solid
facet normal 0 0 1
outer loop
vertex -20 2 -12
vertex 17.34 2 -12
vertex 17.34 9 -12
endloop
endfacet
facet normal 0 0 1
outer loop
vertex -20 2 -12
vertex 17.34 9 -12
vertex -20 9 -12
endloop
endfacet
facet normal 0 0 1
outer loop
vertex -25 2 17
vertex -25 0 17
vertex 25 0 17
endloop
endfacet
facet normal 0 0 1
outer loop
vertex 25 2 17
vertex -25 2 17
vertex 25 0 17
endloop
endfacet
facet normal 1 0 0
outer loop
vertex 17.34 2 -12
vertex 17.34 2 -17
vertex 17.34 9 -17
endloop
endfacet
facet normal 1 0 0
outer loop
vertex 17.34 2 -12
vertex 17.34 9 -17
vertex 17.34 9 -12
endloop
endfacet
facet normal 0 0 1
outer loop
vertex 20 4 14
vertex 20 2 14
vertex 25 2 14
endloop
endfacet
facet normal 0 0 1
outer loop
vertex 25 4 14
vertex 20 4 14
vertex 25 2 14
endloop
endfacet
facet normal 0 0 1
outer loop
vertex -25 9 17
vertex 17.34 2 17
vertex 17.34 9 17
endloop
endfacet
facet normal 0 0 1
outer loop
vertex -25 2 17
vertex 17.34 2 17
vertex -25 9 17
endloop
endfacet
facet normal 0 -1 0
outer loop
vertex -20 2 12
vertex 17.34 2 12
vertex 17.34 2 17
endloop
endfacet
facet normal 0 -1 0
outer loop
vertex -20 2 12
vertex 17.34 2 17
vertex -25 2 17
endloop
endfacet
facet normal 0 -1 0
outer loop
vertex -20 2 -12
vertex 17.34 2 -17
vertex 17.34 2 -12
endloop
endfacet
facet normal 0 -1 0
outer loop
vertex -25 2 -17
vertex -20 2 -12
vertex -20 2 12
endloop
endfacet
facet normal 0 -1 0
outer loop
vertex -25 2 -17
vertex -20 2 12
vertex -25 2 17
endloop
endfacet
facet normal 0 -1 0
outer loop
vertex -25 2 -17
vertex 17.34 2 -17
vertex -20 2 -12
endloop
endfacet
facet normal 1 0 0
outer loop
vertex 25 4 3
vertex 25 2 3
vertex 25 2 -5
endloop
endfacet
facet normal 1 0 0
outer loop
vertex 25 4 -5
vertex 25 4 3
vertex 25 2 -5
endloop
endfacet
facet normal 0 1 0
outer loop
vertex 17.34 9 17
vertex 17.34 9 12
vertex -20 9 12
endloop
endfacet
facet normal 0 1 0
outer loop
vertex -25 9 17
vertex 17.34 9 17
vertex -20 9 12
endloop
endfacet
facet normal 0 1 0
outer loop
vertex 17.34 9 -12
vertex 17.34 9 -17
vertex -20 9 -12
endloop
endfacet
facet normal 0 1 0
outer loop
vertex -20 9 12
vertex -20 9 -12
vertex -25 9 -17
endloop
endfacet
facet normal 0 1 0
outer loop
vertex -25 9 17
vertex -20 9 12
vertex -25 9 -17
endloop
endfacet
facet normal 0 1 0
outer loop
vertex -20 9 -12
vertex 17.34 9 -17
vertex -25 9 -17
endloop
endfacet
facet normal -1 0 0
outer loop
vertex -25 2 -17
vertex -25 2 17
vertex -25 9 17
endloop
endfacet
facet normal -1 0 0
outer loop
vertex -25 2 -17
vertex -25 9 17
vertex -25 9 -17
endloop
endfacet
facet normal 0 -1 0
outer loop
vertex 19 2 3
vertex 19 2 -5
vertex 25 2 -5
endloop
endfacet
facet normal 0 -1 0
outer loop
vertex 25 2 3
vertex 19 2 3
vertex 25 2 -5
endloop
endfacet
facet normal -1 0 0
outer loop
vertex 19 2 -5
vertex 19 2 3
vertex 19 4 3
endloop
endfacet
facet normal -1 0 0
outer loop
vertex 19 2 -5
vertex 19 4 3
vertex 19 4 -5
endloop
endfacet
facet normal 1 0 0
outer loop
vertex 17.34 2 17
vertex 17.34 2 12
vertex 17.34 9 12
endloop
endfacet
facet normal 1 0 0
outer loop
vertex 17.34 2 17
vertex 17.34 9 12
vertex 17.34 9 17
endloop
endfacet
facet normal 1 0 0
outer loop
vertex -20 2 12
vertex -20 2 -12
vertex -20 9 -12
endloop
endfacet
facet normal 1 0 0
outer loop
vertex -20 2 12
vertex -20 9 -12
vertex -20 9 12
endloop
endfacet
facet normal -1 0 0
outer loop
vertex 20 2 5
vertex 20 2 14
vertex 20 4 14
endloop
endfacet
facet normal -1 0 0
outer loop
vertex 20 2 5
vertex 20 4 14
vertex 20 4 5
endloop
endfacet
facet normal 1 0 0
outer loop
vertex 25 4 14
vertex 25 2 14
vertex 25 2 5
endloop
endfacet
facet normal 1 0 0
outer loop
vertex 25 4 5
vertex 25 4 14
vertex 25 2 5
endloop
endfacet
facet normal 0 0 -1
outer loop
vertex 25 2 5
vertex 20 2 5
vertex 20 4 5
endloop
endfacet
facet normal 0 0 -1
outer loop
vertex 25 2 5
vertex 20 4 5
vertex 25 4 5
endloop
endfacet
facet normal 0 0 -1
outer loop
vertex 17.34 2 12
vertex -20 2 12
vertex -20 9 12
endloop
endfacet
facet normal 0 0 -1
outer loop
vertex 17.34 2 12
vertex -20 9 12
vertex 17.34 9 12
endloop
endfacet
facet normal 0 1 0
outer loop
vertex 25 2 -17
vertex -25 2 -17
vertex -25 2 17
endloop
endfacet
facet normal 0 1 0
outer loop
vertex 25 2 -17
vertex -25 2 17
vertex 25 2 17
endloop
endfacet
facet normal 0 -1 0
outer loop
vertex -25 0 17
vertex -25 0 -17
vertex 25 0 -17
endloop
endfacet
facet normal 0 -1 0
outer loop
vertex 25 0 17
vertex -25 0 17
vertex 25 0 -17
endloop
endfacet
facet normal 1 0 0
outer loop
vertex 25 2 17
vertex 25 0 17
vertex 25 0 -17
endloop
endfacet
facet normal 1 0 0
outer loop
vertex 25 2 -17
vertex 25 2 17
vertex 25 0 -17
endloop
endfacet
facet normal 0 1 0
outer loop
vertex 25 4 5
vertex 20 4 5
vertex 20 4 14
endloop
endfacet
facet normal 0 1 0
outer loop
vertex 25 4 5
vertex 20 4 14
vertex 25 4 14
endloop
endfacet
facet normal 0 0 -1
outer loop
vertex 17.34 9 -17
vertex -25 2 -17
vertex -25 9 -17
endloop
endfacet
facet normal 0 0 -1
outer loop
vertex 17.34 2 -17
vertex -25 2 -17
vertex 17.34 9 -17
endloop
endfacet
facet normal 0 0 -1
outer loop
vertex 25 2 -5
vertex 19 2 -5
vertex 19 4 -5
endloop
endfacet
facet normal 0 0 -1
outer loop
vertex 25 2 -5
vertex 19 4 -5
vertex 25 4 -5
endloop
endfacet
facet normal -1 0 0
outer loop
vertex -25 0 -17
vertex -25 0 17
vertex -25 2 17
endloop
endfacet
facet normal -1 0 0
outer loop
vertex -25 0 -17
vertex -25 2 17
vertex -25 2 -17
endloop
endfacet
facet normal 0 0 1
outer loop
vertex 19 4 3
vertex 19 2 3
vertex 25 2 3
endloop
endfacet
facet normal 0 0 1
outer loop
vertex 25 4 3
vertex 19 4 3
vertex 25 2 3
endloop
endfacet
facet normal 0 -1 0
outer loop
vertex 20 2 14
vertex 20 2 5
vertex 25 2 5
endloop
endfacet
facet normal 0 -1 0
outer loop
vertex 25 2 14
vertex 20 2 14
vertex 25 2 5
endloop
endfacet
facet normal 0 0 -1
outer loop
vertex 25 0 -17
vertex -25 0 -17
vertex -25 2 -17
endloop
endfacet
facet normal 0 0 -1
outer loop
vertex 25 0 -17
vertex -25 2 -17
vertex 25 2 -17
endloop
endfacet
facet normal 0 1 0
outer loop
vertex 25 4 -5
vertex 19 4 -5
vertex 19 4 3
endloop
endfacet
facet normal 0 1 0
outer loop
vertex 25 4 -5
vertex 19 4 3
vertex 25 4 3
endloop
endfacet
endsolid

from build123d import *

# Parameters (mm, degrees)
SKETCH_1_W        = 50
SKETCH_1_H        = 34
EXTRUDE_1_DEPTH   = 2
SKETCH_2_W        = 6
SKETCH_2_H        = 8
EXTRUDE_2_DEPTH   = 2
SKETCH_2_W_2      = 5
SKETCH_2_H_2      = 9
EXTRUDE_2_2_DEPTH = 2
EXTRUDE_3_DEPTH   = 7


with BuildPart() as part:
    # 草图1 → 凸台-拉伸1 (new body)
    with BuildSketch(Plane(origin=(0, 0, 0), x_dir=(1, 0, 0), z_dir=(0, 1, 0))):
        Rectangle(SKETCH_1_W, SKETCH_1_H)
    extrude(amount=EXTRUDE_1_DEPTH)


with BuildPart() as body_2:
    # 草图2 → 凸台-拉伸2 (new body)
    with BuildSketch(Plane(origin=(0, 2, 0), x_dir=(1, 0, 0), z_dir=(0, 1, 0))):
        with Locations((22, 1)):
            Rectangle(SKETCH_2_W, SKETCH_2_H)
    extrude(amount=EXTRUDE_2_DEPTH)


with BuildPart() as body_3:
    # 草图2 → Extrude 2 2 (new body)
    with BuildSketch(Plane(origin=(0, 2, 0), x_dir=(1, 0, 0), z_dir=(0, 1, 0))):
        with Locations((22.5, -9.5)):
            Rectangle(SKETCH_2_W_2, SKETCH_2_H_2)
    extrude(amount=EXTRUDE_2_2_DEPTH)


with BuildPart() as body_4:
    # 草图3 → 凸台-拉伸3 (new body)
    with BuildSketch(Plane(origin=(0, 2, 0), x_dir=(1, 0, 0), z_dir=(0, 1, 0))):
        Polygon((17.340449086, 12), (-20, 12), (-20, -12), (17.340449086, -12), (17.340449086, -17), (-25, -17), (-25, 17), (17.340449086, 17), align=None)
    extrude(amount=EXTRUDE_3_DEPTH)


solid = Compound([part.part, body_2.part, body_3.part, body_4.part])
